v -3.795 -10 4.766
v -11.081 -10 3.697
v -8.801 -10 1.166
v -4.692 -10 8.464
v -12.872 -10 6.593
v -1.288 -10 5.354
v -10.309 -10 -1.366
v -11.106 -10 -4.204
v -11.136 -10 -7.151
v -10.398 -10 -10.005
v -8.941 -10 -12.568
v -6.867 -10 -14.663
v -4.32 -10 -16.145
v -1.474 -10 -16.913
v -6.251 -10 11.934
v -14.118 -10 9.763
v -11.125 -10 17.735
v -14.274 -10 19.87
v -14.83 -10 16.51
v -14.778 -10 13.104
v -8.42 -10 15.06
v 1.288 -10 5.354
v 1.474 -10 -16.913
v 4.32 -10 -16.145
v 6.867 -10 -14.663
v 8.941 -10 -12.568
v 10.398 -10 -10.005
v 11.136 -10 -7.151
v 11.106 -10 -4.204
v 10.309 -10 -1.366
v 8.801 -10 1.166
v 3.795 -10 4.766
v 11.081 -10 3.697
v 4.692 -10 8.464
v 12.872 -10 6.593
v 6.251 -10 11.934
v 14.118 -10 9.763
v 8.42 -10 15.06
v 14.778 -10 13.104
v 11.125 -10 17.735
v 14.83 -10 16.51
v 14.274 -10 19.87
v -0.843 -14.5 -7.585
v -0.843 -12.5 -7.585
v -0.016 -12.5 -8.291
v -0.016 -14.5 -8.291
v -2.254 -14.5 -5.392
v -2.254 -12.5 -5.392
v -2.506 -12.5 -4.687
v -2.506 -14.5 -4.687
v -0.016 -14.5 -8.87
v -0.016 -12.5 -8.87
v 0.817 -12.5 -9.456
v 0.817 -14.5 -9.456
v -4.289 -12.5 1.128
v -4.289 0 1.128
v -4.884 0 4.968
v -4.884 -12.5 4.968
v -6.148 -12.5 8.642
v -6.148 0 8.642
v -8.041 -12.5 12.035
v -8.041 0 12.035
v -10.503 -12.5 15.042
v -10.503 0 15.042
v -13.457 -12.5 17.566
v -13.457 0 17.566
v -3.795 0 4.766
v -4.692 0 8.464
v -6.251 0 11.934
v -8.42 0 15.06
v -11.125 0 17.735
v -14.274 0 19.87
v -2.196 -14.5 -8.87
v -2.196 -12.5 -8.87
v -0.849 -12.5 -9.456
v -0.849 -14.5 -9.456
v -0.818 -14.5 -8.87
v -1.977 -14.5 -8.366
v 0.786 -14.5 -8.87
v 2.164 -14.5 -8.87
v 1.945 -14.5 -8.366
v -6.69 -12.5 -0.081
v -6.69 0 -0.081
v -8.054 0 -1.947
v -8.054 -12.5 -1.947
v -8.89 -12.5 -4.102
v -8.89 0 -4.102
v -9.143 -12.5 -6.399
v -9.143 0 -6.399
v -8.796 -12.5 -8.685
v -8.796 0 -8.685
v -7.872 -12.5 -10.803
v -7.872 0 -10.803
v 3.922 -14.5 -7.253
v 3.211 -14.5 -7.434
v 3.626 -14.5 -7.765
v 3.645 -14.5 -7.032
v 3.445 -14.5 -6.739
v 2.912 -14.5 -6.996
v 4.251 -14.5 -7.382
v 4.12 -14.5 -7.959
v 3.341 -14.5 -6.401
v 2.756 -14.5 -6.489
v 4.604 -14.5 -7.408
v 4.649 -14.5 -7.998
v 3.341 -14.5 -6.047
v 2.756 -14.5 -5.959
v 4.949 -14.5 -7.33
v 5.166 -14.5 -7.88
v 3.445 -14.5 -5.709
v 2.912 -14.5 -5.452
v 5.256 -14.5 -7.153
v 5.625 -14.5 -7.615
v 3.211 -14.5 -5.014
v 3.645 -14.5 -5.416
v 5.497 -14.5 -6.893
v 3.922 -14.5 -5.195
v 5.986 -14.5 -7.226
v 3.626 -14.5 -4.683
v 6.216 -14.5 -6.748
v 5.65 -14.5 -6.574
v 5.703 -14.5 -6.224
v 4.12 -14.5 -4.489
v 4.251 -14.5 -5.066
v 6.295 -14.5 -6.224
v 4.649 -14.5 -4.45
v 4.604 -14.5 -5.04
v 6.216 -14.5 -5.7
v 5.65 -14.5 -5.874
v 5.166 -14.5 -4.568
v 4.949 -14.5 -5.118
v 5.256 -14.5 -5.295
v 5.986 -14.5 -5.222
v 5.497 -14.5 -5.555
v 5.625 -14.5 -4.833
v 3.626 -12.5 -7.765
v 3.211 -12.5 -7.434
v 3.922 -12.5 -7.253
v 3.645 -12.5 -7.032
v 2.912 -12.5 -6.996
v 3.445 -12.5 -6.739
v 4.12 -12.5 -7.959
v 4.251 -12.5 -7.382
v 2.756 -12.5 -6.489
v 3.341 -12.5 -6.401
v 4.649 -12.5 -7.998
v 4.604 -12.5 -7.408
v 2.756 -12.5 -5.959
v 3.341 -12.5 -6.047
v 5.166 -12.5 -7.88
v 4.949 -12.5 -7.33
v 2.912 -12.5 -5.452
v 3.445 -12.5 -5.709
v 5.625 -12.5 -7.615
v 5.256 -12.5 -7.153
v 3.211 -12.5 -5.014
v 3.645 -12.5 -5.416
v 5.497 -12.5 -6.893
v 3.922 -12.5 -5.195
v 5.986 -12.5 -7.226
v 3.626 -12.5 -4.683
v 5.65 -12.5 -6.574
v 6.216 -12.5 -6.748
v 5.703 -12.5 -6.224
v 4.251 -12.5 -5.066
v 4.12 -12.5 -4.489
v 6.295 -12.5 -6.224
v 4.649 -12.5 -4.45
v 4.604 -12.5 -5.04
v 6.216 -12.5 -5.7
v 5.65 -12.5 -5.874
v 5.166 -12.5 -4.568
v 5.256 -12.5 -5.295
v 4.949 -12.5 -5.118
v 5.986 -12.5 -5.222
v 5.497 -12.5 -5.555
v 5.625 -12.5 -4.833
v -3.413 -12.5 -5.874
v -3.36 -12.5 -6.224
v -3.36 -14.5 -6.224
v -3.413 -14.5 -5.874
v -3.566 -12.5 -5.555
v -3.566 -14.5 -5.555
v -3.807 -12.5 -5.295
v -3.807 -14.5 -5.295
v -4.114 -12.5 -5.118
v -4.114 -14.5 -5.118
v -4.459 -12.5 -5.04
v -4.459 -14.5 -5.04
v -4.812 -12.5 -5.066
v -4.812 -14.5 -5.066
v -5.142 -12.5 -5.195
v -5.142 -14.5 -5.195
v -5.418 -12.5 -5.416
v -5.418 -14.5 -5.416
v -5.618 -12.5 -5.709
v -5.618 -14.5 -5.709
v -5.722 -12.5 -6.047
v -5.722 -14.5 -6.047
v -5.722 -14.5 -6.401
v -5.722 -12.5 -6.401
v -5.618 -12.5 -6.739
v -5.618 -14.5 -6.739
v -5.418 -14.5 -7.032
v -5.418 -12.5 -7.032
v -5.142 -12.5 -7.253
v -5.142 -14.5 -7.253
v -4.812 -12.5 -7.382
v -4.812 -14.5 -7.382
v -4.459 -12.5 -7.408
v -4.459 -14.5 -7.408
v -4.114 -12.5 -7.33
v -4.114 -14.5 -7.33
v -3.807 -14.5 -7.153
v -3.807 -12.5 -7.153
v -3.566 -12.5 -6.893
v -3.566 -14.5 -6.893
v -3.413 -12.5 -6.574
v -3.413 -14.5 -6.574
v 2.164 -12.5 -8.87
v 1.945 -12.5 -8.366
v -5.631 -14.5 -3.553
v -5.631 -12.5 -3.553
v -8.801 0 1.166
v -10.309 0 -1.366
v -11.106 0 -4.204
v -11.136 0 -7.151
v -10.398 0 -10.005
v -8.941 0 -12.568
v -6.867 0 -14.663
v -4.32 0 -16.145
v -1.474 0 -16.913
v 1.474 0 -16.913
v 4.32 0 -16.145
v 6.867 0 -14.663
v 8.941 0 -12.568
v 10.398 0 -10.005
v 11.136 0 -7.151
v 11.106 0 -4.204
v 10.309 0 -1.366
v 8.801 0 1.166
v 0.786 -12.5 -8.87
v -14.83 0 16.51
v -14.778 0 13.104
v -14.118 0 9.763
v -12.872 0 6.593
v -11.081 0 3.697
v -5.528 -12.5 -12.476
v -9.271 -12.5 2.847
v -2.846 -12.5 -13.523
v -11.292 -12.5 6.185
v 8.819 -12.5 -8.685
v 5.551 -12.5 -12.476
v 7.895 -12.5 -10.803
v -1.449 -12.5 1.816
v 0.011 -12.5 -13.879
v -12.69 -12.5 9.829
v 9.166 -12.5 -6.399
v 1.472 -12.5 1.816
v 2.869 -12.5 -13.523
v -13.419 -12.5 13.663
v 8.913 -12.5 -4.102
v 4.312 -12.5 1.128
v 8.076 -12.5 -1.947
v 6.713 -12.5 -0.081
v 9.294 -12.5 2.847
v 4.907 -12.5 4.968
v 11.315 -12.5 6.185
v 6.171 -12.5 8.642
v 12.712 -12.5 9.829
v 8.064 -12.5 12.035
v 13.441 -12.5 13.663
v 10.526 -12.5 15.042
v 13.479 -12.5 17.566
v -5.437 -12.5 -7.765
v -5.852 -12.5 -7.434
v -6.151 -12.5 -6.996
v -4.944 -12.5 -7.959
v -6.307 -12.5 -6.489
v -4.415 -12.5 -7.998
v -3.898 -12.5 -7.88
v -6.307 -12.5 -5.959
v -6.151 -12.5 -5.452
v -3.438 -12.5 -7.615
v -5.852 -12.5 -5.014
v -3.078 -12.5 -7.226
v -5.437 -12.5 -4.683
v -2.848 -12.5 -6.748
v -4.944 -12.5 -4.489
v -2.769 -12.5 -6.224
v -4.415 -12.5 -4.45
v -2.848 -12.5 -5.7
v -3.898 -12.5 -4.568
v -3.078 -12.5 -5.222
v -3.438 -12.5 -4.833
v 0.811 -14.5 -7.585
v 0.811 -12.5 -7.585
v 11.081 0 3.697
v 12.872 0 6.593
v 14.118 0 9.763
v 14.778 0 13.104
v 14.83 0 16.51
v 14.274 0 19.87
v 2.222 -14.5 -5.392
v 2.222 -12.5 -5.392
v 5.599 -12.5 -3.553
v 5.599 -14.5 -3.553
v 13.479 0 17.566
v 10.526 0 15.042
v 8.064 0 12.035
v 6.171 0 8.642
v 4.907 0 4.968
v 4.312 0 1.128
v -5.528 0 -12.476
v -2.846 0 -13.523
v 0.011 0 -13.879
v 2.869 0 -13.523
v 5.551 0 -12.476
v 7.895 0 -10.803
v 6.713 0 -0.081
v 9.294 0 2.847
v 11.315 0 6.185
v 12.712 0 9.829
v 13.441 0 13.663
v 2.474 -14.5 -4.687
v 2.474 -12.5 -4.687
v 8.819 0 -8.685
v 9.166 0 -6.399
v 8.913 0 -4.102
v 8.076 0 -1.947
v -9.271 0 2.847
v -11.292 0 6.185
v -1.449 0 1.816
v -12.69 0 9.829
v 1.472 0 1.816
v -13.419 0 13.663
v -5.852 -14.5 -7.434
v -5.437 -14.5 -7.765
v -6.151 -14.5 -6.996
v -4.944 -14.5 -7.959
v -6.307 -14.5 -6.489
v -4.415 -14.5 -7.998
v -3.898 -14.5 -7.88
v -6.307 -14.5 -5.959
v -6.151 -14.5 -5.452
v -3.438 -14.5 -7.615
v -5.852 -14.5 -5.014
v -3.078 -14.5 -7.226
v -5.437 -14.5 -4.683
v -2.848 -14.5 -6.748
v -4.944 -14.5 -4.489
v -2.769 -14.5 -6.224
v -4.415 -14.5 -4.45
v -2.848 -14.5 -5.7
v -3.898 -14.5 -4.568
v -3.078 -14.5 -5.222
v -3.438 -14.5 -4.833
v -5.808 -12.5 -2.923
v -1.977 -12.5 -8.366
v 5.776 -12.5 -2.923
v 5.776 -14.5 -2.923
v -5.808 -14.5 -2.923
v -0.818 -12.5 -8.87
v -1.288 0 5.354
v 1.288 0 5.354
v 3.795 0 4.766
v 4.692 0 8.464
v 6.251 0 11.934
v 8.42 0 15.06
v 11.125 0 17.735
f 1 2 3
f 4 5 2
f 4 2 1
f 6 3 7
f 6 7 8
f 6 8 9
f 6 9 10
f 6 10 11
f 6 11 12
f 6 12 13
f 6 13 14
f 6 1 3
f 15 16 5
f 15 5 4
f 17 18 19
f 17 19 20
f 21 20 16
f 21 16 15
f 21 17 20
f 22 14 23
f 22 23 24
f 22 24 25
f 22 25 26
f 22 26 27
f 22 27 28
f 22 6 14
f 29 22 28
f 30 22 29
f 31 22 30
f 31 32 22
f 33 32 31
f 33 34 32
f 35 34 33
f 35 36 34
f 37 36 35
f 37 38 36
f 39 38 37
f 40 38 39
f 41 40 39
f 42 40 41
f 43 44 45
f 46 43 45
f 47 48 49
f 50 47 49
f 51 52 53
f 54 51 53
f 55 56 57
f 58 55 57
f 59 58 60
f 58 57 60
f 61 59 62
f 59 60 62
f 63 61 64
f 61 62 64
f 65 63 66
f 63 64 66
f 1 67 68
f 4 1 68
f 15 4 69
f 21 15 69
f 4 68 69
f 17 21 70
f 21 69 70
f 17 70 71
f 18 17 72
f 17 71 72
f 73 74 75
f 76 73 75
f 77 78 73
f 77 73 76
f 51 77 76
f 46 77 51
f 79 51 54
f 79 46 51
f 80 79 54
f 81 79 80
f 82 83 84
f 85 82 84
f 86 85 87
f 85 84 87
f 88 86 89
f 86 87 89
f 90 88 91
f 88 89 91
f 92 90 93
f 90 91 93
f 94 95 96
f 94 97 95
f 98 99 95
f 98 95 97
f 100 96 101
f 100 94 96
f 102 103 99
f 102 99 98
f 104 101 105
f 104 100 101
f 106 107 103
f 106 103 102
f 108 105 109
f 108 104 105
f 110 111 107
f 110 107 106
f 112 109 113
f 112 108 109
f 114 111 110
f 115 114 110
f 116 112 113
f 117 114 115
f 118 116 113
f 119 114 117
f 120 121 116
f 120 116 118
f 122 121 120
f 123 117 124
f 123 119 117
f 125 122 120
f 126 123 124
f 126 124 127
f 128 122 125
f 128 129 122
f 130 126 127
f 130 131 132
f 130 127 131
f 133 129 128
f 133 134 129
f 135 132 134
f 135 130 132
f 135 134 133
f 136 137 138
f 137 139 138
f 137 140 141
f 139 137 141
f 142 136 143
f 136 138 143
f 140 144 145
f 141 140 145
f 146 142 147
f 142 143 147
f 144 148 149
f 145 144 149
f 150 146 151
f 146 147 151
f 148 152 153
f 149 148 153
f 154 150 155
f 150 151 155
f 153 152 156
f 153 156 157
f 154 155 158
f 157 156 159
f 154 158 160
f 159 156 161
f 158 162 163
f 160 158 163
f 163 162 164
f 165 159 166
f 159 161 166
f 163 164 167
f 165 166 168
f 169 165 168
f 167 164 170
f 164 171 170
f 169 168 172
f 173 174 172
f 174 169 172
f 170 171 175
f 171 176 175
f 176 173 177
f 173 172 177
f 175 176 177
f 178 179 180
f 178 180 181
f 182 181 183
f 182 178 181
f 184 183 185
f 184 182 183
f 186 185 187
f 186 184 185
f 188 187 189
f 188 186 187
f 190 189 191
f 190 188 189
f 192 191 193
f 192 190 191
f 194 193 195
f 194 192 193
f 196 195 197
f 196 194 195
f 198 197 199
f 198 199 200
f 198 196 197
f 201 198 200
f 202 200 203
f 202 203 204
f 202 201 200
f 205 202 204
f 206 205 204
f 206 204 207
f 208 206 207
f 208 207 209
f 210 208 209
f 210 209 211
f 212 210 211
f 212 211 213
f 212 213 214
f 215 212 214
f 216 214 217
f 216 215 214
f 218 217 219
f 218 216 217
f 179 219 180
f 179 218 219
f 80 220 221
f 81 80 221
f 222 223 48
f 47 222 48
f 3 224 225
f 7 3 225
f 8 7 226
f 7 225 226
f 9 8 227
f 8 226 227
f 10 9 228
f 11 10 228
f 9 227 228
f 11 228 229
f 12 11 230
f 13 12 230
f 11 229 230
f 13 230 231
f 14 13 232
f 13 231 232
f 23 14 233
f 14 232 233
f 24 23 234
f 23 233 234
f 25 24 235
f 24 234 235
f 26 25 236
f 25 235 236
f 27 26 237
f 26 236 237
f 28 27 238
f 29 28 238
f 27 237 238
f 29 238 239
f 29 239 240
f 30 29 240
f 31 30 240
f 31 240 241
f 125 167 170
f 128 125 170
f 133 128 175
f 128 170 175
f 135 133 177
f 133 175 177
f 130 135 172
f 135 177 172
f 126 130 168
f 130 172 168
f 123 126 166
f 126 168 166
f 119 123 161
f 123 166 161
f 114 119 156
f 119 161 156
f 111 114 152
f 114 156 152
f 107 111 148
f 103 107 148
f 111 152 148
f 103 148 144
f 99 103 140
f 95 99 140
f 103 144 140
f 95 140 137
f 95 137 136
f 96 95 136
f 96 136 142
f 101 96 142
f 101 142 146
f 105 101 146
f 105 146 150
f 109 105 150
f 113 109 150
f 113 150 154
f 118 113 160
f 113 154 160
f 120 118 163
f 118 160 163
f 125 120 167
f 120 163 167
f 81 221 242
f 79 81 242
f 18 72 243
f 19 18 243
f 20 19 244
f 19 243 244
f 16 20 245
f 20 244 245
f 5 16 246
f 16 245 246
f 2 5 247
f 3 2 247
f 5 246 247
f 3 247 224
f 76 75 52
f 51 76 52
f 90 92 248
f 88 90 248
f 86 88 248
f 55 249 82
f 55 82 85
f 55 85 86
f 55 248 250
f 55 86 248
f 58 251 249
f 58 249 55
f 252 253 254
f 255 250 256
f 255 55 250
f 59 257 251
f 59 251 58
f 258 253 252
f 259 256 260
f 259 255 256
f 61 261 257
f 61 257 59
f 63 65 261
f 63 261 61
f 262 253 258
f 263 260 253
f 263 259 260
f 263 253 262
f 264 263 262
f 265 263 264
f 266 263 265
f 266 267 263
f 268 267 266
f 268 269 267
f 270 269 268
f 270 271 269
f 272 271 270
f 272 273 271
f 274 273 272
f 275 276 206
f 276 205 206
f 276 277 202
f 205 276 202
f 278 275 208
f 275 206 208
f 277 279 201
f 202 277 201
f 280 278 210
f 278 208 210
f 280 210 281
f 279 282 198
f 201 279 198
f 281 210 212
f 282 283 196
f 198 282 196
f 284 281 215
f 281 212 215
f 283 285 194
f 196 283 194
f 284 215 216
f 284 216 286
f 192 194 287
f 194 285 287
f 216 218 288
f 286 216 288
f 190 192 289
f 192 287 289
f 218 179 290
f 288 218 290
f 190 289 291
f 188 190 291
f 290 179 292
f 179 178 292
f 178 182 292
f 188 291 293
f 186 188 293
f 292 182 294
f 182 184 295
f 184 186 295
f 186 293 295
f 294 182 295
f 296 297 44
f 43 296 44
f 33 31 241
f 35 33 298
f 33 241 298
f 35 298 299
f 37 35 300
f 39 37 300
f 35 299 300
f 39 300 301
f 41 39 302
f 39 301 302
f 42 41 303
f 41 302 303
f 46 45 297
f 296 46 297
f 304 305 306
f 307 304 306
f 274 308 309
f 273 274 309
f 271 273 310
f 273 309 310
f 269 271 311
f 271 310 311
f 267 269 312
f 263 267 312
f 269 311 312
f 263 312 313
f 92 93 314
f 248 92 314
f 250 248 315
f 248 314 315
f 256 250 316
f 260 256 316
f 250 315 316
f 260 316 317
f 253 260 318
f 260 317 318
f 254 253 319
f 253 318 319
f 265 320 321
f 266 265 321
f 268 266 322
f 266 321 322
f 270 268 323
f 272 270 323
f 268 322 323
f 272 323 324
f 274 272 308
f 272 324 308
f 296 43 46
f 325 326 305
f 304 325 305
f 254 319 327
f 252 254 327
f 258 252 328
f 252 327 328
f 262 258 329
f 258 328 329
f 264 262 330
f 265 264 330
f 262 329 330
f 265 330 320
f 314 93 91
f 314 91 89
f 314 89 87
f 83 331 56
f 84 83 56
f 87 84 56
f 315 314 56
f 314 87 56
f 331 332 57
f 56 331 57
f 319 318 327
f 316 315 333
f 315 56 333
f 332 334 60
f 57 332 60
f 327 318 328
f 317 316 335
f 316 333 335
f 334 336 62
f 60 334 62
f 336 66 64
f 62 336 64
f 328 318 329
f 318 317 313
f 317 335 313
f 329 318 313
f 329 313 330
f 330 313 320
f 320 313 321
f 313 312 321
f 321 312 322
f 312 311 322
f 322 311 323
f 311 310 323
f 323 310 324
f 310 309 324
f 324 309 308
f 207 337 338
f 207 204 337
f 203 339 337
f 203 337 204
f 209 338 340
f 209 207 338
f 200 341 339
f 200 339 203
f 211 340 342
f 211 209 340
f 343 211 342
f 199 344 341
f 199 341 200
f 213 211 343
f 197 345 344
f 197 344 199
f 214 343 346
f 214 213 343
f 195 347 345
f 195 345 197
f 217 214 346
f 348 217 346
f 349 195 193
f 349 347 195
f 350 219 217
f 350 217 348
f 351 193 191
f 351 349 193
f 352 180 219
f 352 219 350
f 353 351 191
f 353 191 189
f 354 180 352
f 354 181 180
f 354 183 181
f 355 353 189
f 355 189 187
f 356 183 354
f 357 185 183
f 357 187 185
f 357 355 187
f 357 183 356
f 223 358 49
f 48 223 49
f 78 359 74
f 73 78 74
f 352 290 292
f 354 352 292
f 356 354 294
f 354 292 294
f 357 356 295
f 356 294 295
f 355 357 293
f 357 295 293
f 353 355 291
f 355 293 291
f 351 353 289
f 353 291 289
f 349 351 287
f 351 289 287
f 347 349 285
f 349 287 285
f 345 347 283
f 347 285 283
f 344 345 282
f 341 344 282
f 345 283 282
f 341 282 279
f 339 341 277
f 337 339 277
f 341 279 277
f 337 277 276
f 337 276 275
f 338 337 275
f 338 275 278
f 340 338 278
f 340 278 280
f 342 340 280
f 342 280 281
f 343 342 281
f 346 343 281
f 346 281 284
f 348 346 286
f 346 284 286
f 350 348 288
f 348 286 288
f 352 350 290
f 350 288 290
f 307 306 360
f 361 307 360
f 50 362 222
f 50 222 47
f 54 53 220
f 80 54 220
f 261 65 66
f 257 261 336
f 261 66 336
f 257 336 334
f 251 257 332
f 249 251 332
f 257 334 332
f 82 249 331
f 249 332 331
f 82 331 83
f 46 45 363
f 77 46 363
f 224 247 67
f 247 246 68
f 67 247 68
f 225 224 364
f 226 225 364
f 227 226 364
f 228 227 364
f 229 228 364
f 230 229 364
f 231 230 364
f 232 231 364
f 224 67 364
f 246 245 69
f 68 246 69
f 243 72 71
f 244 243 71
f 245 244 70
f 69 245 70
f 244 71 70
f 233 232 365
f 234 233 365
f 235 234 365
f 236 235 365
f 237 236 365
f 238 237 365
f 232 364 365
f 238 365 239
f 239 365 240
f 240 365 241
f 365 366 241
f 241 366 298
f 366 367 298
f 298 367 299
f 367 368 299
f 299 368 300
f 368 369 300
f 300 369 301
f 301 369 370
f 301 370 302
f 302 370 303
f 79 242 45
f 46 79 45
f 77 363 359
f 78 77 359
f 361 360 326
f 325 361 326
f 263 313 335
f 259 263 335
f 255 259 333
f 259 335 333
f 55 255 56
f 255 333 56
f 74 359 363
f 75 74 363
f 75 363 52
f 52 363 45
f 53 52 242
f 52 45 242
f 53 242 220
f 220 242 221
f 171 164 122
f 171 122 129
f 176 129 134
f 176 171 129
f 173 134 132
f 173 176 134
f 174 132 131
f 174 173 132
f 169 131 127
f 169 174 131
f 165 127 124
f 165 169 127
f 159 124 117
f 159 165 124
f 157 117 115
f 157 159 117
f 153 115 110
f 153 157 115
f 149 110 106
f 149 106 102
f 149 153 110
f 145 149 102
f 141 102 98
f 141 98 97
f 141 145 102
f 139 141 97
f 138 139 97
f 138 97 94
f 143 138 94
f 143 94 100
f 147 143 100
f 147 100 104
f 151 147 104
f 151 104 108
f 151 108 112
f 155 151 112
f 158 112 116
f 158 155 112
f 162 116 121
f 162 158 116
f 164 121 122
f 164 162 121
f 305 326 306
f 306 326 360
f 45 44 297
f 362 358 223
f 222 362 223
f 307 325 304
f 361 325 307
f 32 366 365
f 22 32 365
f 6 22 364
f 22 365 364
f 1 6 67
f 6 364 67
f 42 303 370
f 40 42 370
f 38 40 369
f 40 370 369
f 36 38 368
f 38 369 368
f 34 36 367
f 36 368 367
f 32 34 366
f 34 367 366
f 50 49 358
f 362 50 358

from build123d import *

# Parameters (mm, degrees)
F2_DEPTH = 10
F3_DEPTH = 12.5
F6_DEPTH = 2
F5_R     = 1.7792759986
F5_R_2   = 1.1876997662


with BuildPart() as f2:
    # F0 (on Front) → F2 (new body)
    with BuildSketch(Plane.XZ):
        with BuildLine():
            ThreePointArc((-14.2738064751, 19.869748503), (-14.1178299404, 9.763008645), (-8.8008762318, 1.1664673349))
            ThreePointArc((-8.8008762318, 1.1664673349), (0, -17.0102110316), (8.8008762318, 1.1664673349))
            ThreePointArc((8.8008762318, 1.1664673349), (14.1178299404, 9.763008645), (14.2738064751, 19.869748503))
            ThreePointArc((14.2738064751, 19.869748503), (7.2635841838, 13.5466622081), (3.7950583725, 4.7663452684))
            ThreePointArc((3.7950583725, 4.7663452684), (0, 5.4277201824), (-3.7950583725, 4.7663452684))
            ThreePointArc((-3.7950583725, 4.7663452684), (-7.2635841838, 13.5466622081), (-14.2738064751, 19.869748503))
        make_face()
    extrude(amount=F2_DEPTH)


with BuildPart() as f3:
    # F1 (on Front) → F3 (new body)
    with BuildSketch(Plane.XZ):
        with BuildLine():
            ThreePointArc((-13.4565437323, 17.5660512307), (-12.0721921692, 7.9762826093), (-6.6902991314, -0.0807217219))
            ThreePointArc((-6.6902991314, -0.0807217219), (-9.0916522326, -5.2424499921), (-7.8719464411, -10.8032281063))
            ThreePointArc((-7.8719464411, -10.8032281063), (0.0113956802, -13.8790606232), (7.8947378016, -10.8032281063))
            ThreePointArc((7.8947378016, -10.8032281063), (9.1144435931, -5.2424499921), (6.7130904919, -0.0807217219))
            ThreePointArc((6.7130904919, -0.0807217219), (12.0949835297, 7.9762826093), (13.4793350928, 17.5660512307))
            ThreePointArc((13.4793350928, 17.5660512307), (7.042062758, 10.3806469076), (4.3115849096, 1.1279175201))
            ThreePointArc((4.3115849096, 1.1279175201), (0.0113956802, 1.9034316753), (-4.2887935491, 1.1279175201))
            ThreePointArc((-4.2887935491, 1.1279175201), (-7.0192713975, 10.3806469076), (-13.4565437323, 17.5660512307))
        make_face()
    extrude(amount=F3_DEPTH)


with BuildPart() as f6:
    # F5 (on offset) → F6 (new body)
    with BuildSketch(Plane.XZ.offset(12.5)):
        Polygon((-2.5064561482, -4.6867094934), (-5.8078980505, -2.9225801118), (-5.6314850657, -3.5526263528), (-2.2544376983, -5.3923609667), align=None)
    extrude(amount=F6_DEPTH)


with BuildPart() as f6b:
    # F5 (on offset) → F6, piece 2 (new body)
    with BuildSketch(Plane.XZ.offset(12.5)):
        with Locations((-4.5478060342, -6.2240222469)):
            Circle(F5_R)
        with Locations((-4.5478060342, -6.2240222469)):
            Circle(F5_R_2, mode=Mode.SUBTRACT)
    extrude(amount=F6_DEPTH)


with BuildPart() as f6c:
    # F5 (on offset) → F6, piece 3 (new body)
    with BuildSketch(Plane.XZ.offset(12.5)):
        Polygon((0.8108705084, -7.5849220157), (-0.0161319471, -7.5849220157), (-0.8431344026, -7.5849220157), (-0.0161319471, -8.2905739546), align=None)
    extrude(amount=F6_DEPTH)


with BuildPart() as f6d:
    # F5 (on offset) → F6, piece 4 (new body)
    with BuildSketch(Plane.XZ.offset(12.5)):
        Polygon((0.7856685703, -8.8702160865), (-0.0161319471, -8.2905739546), (-0.8179324645, -8.8702160865), (-1.9772174268, -8.3661796525), (-2.1963634824, -8.8702160865), (-0.8490863708, -9.4559881555), (-0.0161319471, -8.8702160865), (0.8168224766, -9.4559881555), (2.1640995882, -8.8702160865), (1.9449535326, -8.3661796525), align=None)
    extrude(amount=F6_DEPTH)


with BuildPart() as f6e:
    # F5 (on offset) → F6, piece 5 (new body)
    with BuildSketch(Plane.XZ.offset(12.5)):
        with Locations((4.5155421399, -6.2240222469)):
            Circle(F5_R)
        with Locations((4.5155421399, -6.2240222469)):
            Circle(F5_R_2, mode=Mode.SUBTRACT)
    extrude(amount=F6_DEPTH)


with BuildPart() as f6f:
    # F5 (on offset) → F6, piece 6 (new body)
    with BuildSketch(Plane.XZ.offset(12.5)):
        Polygon((2.474192254, -4.6867094934), (2.2221738041, -5.3923609667), (5.5992211715, -3.5526263528), (5.7756341562, -2.9225801118), align=None)
    extrude(amount=F6_DEPTH)


solid = Compound([f2.part, f3.part, f6.part, f6b.part, f6c.part, f6d.part, f6e.part, f6f.part])
